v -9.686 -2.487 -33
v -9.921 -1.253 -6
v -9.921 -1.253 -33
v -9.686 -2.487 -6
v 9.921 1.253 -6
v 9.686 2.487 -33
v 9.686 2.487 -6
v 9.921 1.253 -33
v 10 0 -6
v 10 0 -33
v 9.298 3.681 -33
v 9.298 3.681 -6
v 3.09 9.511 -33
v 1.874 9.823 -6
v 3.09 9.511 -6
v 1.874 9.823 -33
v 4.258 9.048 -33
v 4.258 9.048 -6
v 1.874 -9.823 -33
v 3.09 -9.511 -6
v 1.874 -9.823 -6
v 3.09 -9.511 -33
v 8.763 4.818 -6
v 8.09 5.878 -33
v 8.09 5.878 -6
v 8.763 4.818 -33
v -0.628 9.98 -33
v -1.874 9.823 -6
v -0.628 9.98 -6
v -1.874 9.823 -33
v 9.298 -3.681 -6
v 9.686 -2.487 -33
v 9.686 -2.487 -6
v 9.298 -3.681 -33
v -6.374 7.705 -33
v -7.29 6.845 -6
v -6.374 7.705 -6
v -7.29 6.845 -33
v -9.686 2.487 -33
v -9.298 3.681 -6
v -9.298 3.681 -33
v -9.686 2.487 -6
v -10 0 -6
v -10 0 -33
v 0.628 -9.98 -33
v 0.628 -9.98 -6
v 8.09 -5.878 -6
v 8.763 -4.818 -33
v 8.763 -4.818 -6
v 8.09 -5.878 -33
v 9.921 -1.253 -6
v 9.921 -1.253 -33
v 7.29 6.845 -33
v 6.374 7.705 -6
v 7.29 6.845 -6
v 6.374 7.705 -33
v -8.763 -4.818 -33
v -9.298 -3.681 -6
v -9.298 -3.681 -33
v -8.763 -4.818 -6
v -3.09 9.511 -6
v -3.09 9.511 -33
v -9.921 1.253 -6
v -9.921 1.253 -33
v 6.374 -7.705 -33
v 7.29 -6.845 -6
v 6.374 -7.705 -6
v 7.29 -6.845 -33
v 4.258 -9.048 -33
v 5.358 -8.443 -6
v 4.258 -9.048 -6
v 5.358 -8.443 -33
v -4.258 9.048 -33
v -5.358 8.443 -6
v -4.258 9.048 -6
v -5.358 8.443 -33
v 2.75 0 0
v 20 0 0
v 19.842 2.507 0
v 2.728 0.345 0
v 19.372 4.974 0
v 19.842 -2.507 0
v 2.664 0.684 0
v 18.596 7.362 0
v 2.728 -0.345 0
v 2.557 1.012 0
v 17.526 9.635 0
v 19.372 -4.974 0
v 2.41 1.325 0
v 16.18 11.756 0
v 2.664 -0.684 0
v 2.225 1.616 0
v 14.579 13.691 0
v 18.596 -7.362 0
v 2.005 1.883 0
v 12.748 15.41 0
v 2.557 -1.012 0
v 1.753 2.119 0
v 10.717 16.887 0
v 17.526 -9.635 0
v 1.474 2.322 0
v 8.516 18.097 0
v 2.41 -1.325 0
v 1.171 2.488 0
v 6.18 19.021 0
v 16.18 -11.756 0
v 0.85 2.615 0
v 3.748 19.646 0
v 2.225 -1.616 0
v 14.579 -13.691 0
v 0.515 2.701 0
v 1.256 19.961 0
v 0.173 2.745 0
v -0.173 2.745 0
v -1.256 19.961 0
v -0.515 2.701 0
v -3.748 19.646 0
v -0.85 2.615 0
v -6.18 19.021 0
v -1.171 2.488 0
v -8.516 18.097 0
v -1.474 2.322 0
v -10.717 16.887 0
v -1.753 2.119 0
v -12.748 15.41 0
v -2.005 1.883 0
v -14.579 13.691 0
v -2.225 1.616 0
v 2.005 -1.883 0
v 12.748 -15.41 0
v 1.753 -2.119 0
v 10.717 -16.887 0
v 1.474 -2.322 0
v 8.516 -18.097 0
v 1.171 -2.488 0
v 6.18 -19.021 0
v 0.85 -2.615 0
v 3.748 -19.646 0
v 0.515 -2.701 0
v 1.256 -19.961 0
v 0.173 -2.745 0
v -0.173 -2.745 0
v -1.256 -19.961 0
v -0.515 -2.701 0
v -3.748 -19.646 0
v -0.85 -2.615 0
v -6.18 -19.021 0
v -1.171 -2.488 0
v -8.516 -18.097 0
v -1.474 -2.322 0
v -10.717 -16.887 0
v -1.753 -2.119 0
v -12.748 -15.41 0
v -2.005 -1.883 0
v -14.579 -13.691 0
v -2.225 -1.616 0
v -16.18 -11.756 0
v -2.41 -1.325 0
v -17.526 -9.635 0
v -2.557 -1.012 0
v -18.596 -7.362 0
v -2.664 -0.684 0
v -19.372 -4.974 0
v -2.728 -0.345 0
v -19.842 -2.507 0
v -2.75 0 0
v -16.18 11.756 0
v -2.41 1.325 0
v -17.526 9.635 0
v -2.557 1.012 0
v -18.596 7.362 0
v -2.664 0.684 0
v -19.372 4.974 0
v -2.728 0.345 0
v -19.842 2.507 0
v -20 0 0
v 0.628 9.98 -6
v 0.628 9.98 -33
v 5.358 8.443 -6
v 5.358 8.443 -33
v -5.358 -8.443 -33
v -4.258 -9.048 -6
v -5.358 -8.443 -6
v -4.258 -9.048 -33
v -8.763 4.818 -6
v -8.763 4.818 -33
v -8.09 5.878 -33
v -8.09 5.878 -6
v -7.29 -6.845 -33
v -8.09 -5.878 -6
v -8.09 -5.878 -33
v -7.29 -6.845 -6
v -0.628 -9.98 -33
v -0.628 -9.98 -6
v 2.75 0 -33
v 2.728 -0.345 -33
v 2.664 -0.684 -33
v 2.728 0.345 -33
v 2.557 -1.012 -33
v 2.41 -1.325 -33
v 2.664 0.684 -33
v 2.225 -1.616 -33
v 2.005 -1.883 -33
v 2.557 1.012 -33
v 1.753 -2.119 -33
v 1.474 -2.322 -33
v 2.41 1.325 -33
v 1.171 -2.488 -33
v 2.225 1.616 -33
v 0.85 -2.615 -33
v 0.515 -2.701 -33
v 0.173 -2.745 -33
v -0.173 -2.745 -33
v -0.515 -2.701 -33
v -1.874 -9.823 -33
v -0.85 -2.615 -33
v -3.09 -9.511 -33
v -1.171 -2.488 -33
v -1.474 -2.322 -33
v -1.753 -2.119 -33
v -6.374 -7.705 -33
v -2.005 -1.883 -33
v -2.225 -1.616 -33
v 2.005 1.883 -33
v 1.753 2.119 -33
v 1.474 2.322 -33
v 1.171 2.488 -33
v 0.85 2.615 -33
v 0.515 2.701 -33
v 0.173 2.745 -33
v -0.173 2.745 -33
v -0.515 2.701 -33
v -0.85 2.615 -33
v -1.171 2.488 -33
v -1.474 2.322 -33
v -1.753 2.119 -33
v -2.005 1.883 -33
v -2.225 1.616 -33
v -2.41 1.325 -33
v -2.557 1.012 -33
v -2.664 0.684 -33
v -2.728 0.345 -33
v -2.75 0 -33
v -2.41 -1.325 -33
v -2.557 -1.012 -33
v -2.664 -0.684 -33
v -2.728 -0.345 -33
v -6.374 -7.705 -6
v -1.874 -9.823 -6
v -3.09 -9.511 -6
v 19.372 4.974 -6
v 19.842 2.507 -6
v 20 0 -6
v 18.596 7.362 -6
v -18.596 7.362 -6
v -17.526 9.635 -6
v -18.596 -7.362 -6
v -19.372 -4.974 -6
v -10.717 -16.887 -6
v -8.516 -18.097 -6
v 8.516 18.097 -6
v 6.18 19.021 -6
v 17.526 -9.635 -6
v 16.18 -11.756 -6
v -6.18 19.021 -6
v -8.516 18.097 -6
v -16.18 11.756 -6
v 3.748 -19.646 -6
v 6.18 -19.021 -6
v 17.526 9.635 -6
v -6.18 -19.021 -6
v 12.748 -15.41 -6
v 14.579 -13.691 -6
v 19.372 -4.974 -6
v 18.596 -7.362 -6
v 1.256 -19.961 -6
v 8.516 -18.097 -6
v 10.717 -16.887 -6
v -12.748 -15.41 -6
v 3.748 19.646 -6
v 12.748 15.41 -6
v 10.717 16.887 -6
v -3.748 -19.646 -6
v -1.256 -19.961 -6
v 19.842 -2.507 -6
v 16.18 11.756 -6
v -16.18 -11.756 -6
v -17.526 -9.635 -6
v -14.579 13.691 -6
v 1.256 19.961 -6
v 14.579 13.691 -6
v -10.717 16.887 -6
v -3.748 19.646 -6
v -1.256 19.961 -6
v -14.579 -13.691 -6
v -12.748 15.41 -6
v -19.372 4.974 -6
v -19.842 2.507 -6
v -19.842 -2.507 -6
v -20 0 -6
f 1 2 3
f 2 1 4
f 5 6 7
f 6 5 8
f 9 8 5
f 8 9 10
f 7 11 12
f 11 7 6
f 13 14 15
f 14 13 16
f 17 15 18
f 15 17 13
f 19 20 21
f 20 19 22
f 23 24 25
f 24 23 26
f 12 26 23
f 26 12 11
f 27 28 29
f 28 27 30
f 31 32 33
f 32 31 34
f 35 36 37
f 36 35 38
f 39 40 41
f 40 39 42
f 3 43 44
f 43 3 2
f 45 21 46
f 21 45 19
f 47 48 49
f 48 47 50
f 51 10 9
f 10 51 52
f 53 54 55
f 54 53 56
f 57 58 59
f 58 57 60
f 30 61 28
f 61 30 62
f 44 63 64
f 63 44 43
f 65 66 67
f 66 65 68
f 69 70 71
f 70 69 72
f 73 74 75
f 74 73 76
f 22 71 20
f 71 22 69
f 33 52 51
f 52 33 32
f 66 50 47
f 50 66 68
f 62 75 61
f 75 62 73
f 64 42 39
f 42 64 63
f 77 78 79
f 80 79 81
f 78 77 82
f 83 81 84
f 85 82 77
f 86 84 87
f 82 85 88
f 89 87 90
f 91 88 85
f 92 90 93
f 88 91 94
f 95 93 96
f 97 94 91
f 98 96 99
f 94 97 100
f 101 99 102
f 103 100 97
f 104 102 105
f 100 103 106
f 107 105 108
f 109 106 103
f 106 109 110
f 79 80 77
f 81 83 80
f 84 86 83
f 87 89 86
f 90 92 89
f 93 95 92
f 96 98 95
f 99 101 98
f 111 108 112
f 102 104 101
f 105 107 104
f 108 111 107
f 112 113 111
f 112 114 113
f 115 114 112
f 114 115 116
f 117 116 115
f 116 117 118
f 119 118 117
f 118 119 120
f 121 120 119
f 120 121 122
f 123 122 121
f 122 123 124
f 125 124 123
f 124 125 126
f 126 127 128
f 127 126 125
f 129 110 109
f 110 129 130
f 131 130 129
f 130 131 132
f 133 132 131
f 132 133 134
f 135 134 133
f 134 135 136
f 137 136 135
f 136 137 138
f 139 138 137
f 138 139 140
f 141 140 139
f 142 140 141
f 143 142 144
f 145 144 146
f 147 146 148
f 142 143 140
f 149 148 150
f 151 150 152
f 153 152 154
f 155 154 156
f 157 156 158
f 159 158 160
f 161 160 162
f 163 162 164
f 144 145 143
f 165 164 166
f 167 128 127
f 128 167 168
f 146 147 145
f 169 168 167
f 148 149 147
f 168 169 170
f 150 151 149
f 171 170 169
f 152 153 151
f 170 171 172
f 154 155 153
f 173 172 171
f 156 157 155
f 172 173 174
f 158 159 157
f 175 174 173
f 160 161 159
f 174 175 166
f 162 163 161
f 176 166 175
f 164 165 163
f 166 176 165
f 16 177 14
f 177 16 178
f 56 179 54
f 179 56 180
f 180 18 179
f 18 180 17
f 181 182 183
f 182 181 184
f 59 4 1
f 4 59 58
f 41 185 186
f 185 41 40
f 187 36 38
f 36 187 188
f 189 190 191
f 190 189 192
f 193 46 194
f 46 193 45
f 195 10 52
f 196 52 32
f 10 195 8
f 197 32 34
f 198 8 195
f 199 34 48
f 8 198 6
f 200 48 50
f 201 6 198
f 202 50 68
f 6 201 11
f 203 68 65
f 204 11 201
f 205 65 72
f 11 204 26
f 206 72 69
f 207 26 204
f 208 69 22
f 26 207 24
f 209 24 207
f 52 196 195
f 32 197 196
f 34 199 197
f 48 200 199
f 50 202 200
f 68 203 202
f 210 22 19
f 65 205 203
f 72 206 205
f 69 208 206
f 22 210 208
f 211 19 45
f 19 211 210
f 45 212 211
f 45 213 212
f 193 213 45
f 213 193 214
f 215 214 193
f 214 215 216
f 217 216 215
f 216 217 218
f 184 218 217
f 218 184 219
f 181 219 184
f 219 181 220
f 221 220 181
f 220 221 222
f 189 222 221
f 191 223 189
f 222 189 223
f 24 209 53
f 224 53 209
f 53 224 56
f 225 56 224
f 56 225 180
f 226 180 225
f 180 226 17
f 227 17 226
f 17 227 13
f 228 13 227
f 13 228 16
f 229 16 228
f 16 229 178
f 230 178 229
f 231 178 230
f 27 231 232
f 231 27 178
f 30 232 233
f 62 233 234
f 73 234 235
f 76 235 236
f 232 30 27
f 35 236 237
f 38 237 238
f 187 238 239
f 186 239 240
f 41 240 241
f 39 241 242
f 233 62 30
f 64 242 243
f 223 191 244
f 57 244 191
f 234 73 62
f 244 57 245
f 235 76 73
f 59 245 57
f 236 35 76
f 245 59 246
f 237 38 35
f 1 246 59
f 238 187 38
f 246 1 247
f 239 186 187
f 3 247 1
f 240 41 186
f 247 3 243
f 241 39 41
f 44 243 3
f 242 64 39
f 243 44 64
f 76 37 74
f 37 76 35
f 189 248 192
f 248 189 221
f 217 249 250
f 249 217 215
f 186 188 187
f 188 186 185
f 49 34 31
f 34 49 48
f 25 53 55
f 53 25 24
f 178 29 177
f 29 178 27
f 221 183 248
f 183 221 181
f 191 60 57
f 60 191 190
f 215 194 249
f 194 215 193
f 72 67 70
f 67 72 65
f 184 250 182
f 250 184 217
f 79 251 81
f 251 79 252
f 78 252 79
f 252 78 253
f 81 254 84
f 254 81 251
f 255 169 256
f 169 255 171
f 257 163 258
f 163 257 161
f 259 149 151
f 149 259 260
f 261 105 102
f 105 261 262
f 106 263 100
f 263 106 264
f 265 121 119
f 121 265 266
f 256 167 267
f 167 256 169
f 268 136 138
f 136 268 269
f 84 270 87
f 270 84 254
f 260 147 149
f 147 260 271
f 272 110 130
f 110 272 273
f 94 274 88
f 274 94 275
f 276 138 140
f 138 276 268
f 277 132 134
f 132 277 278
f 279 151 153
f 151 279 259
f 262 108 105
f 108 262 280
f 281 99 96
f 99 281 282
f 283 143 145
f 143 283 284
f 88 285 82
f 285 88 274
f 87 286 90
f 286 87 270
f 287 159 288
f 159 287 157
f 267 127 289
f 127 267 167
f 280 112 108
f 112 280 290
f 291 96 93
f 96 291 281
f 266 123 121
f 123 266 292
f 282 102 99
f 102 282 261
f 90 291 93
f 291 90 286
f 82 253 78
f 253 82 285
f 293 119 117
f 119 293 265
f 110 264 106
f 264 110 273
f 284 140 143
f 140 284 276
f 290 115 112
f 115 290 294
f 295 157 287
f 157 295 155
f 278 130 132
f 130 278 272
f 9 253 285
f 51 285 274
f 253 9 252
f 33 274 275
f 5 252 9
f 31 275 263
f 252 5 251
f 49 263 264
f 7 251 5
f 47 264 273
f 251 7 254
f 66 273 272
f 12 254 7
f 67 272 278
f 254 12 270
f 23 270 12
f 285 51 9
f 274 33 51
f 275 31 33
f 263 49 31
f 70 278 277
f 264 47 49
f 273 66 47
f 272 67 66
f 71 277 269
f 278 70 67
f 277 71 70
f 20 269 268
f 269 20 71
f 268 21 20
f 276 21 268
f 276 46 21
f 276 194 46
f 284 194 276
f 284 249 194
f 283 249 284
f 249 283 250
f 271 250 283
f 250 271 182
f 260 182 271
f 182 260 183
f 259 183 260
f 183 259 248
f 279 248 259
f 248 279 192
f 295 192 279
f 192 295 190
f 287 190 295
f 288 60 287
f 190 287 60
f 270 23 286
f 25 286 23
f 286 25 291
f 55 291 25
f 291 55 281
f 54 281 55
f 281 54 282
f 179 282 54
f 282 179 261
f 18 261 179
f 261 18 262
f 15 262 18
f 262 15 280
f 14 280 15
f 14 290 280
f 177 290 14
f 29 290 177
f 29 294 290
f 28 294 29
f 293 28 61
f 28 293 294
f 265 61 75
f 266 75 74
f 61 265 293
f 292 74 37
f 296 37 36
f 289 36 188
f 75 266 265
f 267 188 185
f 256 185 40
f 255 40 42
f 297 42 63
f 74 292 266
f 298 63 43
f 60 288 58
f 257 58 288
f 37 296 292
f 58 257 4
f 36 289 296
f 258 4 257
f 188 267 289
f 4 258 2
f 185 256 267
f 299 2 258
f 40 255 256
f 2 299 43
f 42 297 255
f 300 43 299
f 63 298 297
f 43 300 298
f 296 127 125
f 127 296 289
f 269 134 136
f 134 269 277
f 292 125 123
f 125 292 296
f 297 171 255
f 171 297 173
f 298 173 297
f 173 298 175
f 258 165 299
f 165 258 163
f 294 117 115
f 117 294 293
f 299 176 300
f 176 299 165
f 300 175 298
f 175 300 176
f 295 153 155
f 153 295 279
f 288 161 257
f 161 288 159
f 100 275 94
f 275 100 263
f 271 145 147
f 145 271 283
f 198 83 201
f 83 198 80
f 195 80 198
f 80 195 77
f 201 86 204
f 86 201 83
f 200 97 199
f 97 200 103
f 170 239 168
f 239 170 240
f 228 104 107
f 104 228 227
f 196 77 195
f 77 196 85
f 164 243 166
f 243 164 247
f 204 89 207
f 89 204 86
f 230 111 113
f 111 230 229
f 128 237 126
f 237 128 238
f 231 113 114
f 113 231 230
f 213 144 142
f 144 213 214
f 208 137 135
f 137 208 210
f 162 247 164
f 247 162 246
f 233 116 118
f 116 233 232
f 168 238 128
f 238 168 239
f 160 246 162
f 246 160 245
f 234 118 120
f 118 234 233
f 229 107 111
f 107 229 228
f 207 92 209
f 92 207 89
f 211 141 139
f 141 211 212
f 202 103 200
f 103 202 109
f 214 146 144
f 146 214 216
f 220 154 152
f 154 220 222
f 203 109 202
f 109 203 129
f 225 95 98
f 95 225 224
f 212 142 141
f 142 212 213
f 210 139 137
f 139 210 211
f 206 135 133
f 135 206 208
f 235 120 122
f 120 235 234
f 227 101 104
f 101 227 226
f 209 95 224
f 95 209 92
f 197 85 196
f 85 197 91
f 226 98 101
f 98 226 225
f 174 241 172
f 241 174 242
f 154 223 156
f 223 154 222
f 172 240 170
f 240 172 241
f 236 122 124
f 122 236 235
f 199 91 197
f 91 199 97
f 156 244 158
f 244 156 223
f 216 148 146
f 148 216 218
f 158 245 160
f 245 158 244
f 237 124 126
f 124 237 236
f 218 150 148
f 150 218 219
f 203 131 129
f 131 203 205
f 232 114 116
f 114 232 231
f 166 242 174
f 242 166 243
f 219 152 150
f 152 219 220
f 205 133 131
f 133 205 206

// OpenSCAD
$fn = 50;


difference() {
	union() {
		translate(v = [0, 0, -33.0000000000]) {
			cylinder(h = 33, r = 10.0000000000);
		}
		translate(v = [0, 0, -6.0000000000]) {
			cylinder(h = 6, r = 20.0000000000);
		}
	}
	union() {
		#translate(v = [0, 0, -33]) {
			cylinder(h = 33, r = 2.7500000000);
		}
	}
}
